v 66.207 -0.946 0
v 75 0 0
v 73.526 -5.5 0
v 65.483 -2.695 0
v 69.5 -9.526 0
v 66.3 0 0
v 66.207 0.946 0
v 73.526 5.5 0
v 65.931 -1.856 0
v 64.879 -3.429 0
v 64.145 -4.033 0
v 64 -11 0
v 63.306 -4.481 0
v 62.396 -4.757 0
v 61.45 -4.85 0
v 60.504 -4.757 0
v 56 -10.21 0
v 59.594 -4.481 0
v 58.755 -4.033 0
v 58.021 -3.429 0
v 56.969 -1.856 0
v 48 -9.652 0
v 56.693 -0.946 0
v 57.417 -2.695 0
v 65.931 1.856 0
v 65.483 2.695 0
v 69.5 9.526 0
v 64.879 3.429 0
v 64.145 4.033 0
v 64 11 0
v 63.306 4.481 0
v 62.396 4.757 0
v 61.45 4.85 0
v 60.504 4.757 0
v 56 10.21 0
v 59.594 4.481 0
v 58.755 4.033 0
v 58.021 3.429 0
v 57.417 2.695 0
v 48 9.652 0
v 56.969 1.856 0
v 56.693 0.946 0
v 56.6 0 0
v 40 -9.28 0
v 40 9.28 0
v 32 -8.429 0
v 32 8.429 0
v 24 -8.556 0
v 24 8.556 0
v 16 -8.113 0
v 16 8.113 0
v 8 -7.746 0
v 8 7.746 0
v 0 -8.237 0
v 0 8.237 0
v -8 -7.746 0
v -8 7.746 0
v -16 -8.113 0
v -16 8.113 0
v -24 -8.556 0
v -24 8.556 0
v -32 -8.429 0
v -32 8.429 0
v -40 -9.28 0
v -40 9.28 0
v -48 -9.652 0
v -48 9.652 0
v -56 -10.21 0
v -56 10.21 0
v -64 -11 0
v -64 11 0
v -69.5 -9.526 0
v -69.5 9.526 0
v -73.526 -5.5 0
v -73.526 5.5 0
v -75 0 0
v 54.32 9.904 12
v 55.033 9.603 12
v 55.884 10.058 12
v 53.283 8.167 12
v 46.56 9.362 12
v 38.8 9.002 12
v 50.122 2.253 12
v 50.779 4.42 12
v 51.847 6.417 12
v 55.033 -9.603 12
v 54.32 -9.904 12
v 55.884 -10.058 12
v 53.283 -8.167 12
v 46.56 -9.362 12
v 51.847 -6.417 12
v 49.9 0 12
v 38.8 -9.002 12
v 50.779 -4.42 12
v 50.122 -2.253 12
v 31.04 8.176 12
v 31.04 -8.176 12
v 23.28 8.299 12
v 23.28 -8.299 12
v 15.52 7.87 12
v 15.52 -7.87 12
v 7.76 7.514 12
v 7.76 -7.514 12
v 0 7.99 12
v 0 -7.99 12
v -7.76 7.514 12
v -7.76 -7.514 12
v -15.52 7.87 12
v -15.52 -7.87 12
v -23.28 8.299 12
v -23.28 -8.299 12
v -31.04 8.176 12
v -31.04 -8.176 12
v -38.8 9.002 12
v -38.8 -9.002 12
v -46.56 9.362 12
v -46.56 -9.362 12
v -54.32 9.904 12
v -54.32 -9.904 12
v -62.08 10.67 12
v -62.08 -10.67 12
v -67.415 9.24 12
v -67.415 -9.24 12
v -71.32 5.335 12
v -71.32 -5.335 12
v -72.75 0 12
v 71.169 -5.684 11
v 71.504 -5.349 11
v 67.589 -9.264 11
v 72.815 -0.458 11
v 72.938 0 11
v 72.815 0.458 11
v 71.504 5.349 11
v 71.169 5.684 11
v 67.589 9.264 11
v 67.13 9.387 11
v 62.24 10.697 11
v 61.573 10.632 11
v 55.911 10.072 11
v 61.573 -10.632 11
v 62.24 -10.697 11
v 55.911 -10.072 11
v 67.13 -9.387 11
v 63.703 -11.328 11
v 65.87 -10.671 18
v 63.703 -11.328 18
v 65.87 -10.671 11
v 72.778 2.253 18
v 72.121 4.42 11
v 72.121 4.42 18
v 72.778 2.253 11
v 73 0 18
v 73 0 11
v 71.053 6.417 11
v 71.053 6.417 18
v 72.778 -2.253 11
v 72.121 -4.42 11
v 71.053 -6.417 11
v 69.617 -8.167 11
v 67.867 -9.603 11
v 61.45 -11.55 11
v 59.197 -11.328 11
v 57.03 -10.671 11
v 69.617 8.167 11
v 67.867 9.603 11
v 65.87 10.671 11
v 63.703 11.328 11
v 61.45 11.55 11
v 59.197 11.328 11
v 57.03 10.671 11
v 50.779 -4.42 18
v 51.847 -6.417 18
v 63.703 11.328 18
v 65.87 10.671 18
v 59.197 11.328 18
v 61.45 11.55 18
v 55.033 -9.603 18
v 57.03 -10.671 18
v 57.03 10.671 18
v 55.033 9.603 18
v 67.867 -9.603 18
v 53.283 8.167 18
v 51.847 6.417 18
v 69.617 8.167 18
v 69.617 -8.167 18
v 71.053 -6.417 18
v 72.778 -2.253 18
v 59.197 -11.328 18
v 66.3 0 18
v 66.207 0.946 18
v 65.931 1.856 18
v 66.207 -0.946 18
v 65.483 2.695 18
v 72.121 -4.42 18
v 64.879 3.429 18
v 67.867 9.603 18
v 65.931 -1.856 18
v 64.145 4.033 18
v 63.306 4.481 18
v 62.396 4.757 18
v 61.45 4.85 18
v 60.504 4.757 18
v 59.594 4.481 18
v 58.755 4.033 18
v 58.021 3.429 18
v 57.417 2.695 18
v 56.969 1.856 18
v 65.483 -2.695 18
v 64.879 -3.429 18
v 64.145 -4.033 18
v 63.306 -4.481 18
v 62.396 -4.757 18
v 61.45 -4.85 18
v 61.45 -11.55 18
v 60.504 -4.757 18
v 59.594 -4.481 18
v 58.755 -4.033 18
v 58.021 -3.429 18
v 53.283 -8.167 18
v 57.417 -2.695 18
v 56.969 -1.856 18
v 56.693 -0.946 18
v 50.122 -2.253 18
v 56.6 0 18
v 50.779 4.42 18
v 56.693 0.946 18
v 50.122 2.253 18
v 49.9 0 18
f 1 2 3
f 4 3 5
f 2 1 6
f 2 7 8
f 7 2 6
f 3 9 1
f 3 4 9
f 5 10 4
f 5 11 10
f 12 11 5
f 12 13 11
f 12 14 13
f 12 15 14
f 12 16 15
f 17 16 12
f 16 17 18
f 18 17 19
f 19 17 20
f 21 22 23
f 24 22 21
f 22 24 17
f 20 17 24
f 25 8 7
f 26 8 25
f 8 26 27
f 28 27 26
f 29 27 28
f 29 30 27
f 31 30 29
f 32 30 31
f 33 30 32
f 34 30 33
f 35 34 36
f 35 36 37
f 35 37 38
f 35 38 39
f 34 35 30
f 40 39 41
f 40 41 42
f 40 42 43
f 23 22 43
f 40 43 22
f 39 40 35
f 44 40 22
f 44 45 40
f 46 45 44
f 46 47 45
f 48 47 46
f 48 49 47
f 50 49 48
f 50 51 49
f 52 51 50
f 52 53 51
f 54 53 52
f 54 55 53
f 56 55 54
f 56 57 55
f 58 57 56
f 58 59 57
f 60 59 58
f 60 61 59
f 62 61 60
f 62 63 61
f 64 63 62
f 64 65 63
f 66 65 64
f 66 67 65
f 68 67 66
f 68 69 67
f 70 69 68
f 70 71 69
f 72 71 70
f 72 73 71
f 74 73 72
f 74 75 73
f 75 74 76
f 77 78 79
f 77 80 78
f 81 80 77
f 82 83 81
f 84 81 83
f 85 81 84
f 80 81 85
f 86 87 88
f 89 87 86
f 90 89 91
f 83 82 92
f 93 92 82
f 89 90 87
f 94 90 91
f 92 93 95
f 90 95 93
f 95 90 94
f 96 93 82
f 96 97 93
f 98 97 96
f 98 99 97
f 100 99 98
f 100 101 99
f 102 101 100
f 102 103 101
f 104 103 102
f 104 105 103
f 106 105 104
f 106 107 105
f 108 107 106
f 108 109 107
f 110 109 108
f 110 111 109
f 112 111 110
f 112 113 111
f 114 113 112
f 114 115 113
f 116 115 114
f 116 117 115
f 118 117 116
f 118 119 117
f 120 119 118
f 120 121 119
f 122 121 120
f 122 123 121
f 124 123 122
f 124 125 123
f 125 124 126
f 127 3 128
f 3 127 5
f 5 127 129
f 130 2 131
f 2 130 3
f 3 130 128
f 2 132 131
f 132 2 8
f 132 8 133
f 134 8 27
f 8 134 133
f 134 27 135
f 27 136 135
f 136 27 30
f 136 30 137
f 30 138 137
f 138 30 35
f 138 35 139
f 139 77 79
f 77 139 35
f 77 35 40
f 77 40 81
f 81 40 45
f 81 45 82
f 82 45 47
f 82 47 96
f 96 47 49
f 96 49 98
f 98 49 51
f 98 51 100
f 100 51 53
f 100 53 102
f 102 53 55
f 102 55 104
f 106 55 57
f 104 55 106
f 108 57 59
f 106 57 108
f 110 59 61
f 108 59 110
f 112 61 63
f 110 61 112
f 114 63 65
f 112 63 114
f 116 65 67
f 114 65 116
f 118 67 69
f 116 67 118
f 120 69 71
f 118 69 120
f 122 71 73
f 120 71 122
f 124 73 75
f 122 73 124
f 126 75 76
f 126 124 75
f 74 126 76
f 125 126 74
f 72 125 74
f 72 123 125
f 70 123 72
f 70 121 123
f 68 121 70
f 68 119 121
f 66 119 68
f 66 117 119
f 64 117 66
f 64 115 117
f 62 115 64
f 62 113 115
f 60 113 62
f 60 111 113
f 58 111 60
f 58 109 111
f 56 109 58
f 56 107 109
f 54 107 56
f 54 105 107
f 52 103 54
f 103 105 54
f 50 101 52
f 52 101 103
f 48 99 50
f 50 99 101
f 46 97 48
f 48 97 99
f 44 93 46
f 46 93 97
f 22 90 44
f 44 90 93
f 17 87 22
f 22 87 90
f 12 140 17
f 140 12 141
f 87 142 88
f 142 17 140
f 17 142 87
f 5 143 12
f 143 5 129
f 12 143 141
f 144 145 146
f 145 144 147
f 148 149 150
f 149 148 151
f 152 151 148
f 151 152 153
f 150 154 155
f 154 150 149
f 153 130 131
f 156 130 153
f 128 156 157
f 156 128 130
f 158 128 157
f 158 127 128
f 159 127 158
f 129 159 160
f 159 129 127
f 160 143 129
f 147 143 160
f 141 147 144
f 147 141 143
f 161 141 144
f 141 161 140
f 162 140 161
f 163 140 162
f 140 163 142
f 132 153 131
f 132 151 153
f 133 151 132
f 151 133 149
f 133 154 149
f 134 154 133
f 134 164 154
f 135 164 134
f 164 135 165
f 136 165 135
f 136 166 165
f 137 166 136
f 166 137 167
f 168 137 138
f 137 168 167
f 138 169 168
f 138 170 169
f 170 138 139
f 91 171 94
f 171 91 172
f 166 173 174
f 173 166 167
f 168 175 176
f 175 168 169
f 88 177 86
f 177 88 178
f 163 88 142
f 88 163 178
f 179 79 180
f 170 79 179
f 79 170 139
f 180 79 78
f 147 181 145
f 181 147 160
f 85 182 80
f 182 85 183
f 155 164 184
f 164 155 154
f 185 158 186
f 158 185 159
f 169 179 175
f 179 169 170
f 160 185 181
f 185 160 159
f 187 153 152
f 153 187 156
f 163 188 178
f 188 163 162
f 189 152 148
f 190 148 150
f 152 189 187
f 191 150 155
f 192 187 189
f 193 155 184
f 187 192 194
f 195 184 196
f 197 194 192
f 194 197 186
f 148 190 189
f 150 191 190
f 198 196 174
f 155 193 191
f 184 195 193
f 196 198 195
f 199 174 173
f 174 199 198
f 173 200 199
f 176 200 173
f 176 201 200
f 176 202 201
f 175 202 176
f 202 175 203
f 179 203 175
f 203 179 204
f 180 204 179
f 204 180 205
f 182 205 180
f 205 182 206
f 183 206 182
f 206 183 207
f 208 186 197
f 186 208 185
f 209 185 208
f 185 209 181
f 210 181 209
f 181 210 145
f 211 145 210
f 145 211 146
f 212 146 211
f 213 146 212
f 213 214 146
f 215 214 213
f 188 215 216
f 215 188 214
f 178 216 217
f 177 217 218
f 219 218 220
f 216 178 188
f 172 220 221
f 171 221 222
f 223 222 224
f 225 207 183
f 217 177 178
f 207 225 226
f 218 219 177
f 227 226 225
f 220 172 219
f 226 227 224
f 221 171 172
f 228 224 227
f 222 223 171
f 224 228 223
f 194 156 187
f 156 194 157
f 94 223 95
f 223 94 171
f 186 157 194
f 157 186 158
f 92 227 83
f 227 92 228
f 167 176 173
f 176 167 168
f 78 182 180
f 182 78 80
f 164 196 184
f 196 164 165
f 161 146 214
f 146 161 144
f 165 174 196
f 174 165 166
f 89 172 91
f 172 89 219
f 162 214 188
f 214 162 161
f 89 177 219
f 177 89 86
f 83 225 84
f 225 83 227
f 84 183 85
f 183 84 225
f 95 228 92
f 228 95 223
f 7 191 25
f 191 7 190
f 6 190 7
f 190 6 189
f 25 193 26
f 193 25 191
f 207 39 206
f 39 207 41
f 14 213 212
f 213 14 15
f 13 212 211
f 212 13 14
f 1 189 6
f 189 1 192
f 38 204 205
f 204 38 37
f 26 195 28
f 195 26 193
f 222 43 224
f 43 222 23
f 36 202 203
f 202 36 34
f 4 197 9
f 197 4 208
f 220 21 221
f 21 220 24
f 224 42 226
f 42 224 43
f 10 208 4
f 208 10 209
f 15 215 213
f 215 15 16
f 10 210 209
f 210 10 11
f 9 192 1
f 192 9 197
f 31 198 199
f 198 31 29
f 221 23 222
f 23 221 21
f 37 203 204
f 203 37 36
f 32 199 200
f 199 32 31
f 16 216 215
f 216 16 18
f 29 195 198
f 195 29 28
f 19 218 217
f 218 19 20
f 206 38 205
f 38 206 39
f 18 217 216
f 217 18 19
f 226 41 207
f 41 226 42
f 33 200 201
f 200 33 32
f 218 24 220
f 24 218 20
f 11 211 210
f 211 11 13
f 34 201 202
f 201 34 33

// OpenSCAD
$fn = 32;

// ----------------------------------------------------------------------
// Handle: 150 x 22 mm grip, 12 mm thick
// ----------------------------------------------------------------------

// --- parameters (mm) ---
length = 150;             // grip length
width = 22;               // grip width
thickness = 12;           // grip thickness
waist = 0.72;             // width factor at the middle
draft = 0.97;             // top face scale of the extrusion
scallops = 6;             // finger rests per side
ripple = 0.04;            // depth factor of the finger rests
boss_d = 23.1;            // mounting boss diameter
boss_h = 6;               // mounting boss height
boss_hole_d = 9.7;        // screw clearance through the boss
boss_r = 61.45;           // boss centre from the grip centre

/* ergonomic grip outline, closed spline-like polygon in the XY plane */
grip = [[-64, 11], [-56, 10.21], [-48, 9.652], [-40, 9.28], [-32, 8.429], [-24, 8.556], [-16, 8.113], [-8, 7.746], [0, 8.237], [8, 7.746], [16, 8.113], [24, 8.556], [32, 8.429], [40, 9.28], [48, 9.652], [56, 10.21], [64, 11], [69.5, 9.526], [73.526, 5.5], [75, 0], [73.526, -5.5], [69.5, -9.526], [64, -11], [64, -11], [56, -10.21], [48, -9.652], [40, -9.28], [32, -8.429], [24, -8.556], [16, -8.113], [8, -7.746], [0, -8.237], [-8, -7.746], [-16, -8.113], [-24, -8.556], [-32, -8.429], [-40, -9.28], [-48, -9.652], [-56, -10.21], [-64, -11], [-69.5, -9.526], [-73.526, -5.5], [-75, 0], [-73.526, 5.5], [-69.5, 9.526], [-64, 11]];

module grip_body() {
  linear_extrude(height = thickness, scale = draft) polygon(grip);
}

module boss_body() {
  /* sunk 1 mm into the grip so the joint overlaps */
  translate([boss_r, 0, thickness - 1]) cylinder(h = boss_h + 1, d = boss_d);
}

difference() {
  union() {
    grip_body();
    boss_body();
  }
  translate([boss_r, 0, -1]) cylinder(h = thickness + boss_h + 2, d = boss_hole_d);
}
